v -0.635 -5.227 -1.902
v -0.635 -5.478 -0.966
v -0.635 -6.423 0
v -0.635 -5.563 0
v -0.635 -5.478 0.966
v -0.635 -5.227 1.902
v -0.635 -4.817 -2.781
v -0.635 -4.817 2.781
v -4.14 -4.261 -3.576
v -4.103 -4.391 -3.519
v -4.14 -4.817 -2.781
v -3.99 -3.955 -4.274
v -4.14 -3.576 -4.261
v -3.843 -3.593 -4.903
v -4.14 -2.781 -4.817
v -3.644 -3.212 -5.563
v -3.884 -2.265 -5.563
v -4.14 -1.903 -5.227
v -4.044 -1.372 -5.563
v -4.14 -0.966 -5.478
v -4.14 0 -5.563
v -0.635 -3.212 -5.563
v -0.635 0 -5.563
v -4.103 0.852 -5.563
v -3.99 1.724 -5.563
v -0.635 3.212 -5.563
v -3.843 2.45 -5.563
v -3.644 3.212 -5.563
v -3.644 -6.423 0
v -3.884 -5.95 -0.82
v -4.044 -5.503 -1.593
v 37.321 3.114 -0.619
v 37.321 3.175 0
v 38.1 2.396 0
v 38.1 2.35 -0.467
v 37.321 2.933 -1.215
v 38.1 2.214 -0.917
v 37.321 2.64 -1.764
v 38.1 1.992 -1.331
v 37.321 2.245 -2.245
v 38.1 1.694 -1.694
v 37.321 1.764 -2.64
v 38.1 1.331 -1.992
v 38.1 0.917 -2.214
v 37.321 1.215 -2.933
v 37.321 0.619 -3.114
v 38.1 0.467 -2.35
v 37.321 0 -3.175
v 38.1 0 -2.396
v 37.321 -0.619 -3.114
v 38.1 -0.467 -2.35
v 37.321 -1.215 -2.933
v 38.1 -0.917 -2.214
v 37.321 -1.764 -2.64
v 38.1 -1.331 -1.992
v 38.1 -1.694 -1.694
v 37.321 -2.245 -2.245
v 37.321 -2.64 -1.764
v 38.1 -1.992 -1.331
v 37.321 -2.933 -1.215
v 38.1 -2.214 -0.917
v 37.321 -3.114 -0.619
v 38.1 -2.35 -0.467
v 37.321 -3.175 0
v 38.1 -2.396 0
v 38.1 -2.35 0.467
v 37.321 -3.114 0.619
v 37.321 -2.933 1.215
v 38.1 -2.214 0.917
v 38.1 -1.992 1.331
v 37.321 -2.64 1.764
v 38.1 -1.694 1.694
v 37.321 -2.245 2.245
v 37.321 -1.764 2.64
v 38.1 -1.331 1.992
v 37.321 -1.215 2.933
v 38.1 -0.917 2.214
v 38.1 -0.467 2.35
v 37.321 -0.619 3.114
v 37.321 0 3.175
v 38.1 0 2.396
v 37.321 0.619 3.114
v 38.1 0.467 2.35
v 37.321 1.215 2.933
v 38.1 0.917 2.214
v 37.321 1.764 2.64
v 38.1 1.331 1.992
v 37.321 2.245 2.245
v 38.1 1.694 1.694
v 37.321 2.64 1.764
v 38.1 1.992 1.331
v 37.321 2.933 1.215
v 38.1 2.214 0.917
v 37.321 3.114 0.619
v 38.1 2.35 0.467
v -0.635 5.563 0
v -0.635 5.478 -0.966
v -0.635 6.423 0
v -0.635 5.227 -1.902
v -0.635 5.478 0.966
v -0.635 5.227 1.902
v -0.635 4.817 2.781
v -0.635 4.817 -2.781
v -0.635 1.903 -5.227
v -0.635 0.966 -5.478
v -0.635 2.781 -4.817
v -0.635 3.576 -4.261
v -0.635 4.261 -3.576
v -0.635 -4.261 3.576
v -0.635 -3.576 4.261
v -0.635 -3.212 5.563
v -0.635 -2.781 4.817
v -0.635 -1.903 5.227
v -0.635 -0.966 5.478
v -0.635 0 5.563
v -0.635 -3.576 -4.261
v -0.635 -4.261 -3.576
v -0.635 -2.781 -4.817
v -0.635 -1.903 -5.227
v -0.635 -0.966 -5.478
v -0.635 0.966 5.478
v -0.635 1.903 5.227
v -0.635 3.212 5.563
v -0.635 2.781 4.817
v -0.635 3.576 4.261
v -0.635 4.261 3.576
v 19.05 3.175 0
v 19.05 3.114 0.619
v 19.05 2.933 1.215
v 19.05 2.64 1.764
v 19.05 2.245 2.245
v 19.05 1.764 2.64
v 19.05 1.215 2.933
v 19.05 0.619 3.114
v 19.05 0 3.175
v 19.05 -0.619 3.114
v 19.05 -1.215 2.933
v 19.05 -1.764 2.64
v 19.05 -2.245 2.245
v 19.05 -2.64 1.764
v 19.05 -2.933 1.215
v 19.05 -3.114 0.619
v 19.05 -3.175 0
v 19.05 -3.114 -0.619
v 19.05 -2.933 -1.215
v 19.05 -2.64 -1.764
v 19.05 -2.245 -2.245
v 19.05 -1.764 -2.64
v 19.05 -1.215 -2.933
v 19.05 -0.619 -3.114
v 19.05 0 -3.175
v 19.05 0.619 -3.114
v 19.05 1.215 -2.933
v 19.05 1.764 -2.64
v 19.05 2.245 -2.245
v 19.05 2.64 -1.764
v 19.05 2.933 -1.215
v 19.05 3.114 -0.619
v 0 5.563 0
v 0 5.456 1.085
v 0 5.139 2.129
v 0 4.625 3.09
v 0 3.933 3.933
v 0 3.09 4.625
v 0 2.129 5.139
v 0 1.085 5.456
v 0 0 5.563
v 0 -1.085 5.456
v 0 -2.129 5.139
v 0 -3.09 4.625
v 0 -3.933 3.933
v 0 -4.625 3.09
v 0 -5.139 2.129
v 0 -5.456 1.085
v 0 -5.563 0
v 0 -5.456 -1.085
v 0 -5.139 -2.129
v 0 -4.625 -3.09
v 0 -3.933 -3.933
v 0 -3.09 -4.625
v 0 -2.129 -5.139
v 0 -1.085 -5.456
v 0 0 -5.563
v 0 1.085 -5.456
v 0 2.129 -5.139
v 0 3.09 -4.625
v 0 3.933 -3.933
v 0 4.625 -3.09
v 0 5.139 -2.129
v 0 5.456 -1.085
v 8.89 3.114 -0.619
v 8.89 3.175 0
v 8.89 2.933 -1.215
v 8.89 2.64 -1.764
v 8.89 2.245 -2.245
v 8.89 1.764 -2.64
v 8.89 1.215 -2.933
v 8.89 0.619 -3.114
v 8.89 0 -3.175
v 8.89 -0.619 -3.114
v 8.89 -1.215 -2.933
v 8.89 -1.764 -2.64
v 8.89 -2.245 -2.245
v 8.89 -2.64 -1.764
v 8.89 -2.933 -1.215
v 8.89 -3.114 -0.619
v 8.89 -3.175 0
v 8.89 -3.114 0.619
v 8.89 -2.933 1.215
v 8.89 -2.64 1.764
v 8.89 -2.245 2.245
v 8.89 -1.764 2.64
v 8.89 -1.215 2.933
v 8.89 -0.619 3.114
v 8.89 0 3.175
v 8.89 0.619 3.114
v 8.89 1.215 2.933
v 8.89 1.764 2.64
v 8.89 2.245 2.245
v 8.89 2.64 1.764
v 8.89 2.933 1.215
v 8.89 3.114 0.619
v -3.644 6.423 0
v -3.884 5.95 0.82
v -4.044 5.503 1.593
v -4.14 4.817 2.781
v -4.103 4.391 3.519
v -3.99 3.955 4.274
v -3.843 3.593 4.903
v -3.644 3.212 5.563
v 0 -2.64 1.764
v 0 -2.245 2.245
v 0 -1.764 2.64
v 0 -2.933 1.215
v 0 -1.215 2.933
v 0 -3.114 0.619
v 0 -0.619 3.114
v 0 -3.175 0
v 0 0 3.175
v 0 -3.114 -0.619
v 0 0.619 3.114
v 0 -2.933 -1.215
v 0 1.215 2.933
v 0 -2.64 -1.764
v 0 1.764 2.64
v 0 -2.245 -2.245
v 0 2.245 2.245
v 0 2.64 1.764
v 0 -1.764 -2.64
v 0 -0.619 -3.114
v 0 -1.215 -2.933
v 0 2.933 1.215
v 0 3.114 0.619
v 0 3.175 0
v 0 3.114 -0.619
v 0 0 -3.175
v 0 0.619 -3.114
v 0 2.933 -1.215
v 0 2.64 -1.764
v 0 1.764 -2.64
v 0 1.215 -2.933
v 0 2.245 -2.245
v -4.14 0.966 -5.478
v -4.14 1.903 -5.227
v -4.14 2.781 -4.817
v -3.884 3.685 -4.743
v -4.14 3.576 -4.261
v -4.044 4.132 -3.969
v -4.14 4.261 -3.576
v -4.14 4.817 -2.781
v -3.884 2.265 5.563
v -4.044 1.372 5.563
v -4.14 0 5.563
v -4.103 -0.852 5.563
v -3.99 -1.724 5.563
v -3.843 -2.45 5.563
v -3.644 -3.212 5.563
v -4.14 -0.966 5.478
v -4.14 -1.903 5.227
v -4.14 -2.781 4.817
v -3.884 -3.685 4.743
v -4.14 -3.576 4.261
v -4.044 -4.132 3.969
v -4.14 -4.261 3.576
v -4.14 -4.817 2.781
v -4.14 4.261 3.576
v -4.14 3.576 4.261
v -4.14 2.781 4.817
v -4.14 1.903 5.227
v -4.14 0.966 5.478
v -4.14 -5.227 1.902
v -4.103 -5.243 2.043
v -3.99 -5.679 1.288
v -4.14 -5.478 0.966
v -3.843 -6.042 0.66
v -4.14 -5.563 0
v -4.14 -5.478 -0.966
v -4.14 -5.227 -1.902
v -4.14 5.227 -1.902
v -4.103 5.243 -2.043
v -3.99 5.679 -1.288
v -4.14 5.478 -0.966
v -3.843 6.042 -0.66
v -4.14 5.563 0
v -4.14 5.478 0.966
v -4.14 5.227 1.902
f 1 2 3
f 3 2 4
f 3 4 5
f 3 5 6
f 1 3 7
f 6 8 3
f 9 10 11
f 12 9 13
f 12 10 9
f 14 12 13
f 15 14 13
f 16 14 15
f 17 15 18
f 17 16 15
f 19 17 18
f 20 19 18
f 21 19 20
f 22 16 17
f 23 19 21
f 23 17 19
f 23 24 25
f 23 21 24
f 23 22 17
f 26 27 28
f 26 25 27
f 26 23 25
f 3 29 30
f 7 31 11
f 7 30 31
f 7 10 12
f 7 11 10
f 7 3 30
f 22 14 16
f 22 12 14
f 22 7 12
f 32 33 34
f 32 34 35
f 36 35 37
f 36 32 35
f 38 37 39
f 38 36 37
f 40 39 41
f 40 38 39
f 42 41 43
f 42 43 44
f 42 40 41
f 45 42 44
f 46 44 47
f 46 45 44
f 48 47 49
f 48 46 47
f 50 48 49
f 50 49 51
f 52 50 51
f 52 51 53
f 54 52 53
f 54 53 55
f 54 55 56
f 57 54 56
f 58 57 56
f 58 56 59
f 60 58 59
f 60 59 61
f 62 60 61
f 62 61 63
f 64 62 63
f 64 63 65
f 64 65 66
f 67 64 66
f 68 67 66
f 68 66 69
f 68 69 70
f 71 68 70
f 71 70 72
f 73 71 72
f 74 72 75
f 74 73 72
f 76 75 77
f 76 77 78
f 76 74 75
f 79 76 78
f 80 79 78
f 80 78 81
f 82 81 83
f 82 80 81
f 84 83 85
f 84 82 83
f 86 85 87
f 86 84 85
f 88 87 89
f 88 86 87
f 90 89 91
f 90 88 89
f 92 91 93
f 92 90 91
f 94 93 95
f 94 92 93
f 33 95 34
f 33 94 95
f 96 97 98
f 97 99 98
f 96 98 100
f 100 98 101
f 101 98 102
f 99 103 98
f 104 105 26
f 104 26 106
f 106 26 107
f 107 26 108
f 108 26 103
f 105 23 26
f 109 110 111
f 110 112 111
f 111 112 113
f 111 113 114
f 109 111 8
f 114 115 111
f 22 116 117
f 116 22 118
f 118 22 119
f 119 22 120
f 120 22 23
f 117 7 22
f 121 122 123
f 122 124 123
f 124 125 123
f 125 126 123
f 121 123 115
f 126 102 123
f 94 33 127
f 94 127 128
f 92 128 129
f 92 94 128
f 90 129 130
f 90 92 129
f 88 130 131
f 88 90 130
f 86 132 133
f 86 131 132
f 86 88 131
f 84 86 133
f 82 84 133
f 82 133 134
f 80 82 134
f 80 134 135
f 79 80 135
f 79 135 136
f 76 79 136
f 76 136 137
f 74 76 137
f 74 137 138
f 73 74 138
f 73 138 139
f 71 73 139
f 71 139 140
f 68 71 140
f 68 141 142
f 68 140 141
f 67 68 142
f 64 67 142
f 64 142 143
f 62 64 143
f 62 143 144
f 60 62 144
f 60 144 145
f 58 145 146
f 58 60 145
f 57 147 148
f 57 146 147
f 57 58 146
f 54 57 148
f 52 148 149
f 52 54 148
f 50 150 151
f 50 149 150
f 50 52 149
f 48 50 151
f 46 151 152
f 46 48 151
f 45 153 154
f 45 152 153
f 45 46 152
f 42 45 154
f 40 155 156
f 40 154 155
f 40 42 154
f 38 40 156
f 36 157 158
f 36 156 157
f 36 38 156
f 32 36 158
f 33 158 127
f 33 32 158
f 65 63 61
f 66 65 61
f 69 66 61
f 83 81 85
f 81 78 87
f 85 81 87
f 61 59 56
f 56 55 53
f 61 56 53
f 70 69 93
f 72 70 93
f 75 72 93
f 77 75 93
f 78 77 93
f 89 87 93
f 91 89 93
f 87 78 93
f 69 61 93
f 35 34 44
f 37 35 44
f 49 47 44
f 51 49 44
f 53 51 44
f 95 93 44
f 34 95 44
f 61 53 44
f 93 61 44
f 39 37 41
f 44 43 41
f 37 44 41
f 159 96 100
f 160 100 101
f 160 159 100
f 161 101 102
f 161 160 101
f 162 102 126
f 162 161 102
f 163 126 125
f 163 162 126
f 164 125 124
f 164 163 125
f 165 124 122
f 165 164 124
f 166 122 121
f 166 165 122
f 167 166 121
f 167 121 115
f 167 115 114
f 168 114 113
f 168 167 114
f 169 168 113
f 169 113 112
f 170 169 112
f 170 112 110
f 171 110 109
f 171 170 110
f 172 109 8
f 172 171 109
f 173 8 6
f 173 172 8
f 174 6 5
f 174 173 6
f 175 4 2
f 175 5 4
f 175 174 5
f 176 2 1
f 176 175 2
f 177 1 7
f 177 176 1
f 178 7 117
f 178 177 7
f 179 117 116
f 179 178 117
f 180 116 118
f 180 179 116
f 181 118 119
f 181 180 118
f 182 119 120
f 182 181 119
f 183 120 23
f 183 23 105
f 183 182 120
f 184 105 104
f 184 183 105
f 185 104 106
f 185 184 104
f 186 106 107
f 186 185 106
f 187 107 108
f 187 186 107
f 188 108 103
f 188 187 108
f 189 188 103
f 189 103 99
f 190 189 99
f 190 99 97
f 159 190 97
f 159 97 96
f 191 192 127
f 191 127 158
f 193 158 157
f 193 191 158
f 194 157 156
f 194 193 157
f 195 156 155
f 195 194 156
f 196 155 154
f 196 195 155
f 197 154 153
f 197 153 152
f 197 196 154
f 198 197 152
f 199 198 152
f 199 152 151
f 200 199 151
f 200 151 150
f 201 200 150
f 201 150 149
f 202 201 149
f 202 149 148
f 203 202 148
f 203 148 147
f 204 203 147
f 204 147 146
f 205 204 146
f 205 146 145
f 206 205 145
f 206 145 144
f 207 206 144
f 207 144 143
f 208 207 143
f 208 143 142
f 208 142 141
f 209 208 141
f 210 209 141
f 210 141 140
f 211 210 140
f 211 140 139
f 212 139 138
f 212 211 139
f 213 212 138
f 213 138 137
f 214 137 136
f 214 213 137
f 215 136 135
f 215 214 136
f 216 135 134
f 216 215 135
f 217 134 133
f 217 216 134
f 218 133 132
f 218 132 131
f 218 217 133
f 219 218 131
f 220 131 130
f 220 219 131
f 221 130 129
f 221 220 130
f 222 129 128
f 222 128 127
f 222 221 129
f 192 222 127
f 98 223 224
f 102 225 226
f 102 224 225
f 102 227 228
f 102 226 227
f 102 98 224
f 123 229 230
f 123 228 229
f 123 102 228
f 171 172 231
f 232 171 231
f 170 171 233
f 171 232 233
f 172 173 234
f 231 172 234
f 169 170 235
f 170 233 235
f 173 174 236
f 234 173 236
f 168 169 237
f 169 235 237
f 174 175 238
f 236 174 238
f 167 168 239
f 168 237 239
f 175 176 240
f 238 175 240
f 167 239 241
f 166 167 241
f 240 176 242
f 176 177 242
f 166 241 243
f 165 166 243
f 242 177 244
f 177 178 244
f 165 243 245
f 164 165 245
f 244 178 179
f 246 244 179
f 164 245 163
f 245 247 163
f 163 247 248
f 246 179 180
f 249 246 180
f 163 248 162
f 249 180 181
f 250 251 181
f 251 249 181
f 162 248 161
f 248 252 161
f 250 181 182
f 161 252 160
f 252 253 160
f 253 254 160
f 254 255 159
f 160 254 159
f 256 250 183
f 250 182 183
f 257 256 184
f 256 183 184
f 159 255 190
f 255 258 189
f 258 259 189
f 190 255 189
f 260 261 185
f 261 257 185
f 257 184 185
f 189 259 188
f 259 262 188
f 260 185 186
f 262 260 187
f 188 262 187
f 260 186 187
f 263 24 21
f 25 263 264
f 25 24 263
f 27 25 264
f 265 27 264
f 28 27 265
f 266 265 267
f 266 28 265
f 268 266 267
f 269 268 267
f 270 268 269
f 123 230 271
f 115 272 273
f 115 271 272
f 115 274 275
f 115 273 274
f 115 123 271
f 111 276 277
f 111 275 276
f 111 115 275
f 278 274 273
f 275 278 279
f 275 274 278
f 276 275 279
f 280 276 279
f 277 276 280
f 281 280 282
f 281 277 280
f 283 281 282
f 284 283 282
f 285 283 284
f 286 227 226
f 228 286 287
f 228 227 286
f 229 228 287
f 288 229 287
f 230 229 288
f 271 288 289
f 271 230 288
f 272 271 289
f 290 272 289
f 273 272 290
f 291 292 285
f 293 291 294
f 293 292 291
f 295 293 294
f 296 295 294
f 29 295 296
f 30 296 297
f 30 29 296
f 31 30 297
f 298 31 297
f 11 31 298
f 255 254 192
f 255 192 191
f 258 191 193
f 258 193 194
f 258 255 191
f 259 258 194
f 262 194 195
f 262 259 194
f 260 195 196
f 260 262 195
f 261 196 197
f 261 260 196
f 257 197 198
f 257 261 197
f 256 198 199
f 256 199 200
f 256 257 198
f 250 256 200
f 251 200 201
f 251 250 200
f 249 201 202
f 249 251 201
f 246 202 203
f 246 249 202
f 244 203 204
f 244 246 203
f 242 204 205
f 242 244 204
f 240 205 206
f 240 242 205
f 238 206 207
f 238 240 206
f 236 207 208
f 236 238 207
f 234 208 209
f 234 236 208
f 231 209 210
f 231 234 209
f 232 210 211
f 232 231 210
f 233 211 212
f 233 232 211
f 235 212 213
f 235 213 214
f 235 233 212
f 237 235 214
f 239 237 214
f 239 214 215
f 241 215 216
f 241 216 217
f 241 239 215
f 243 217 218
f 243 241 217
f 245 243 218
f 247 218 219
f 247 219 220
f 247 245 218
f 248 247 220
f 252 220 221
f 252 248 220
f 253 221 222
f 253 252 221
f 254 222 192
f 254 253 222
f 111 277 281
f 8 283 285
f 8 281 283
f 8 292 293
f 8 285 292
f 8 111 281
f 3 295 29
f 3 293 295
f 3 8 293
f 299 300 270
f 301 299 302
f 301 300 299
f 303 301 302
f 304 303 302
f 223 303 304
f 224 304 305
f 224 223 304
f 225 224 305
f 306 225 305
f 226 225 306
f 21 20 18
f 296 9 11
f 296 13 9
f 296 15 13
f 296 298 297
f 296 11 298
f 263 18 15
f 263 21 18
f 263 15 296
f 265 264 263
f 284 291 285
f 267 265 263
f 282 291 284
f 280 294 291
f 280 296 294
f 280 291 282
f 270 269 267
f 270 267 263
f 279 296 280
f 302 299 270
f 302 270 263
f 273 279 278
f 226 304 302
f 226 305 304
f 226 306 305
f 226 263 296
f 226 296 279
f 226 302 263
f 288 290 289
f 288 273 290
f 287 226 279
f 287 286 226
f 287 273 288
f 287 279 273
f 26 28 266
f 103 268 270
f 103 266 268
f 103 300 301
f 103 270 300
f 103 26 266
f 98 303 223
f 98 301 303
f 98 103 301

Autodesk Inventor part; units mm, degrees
ref_plane "YZ Plane" through (0, 0, 0) normal (1, 0, 0) x (0, 1, 0)
ref_plane "XZ Plane" through (0, 0, 0) normal (0, 1, 0) x (-1, 0, 0)
sketch "Sketch1" plane through (0, 0, 0) normal (0, 0, 1) x (1, 0, 0)
  line L0 (0, 5.5626) -> (0, 3.175)
  line L1 (19.05, 3.175) -> (38.1, 3.175)
  line L2 (38.1, 3.175) -> (38.1, 0)
  line L3 (38.1, 0) -> (-0.6351, 0)
  line L4 (-8.3821, 0) -> (45.847, 0) projected
  line L5 (-0.6351, 0) -> (-0.6351, 5.5626)
  line L6 (-0.6351, 5.5626) -> (0, 5.5626)
  line L7 (19.05, 3.175) -> (8.8899, 3.175)
  line L8 (8.8899, 3.175) -> (0, 3.175)
  line L9 (0, -1.1125) -> (0, 6.6751) projected
  dimension "d0" = 38.1
  dimension "d1" = 19.05
  dimension "d2" = 6.35
  dimension "d9" = 0.6351
  dimension "d10" = 11.1252
  dimension "d13" = 10.1601
  dimension "d14" = 6.35
revolve "Body" add sketch "Sketch1" angle 360 about axis through (38.1, 0, 0) along (-1, 0, 0)
sketch "Sketch2" plane through (-0.6351, 0, 0) normal (-1, 0, 0) x (0, 0, 1)
  line L0 (0, 6.4231) -> (5.5626, 3.2116)
  line L1 (5.5626, 3.2116) -> (5.5626, -3.2116)
  line L2 (5.5626, -3.2116) -> (0, -6.4231)
  line L3 (0, -6.4231) -> (-5.5626, -3.2116)
  line L4 (-5.5626, -3.2116) -> (-5.5626, 3.2116)
  line L5 (-5.5626, 3.2116) -> (0, 6.4231)
  point P0 (0, 0)
  point P1 (0, 0)
  dimension "d11" = 11.1252
extrude "Head" add sketch "Sketch2" along normal blind 3.5052
sketch "Sketch4" plane through (0, 0, 0) normal (0, 0, 1) x (1, 0, 0)
  line L0 (-4.1403, 5.5626) -> (-4.1403, 6.4231)
  line L1 (-4.1403, 6.4231) -> (-3.6435, 6.4231)
  line L2 (-3.6435, 6.4231) -> (-4.1403, 5.5626)
  line L3 (-4.8413, 0) -> (0.0659, 0) projected
  line L4 (-0.6351, 6.4231) -> (-4.1403, 6.4231) projected
  line L5 (-4.1403, 3.2116) -> (-4.1403, 6.4231) projected
  dimension "d5" = 30
  dimension "d19" = 11.1252
revolve "Chamfer1" cut sketch "Sketch4" angle 360 about axis through (-10, 0, 0) along (1, 0, 0)
thread "Thread" size "1/4-20 UNC" class "2A" standard "ANSI Unified Screw Threads" length 19.05
chamfer "Chamfer2" distance 0.779 distance2 0.7791 1 edges at (38.1, -3.175, 0) measured on face at (38.1, -0.7017, 0.0433)
ref_plane "Work Plane1" through (1.525, 0, 0) normal (0, 0, 1) x (1, 0, 0)
equation "\"d0\" = NLG"
equation "\"d1\" = GEL"
equation "\"d2\" = GD"
equation "\"d10\" = SD2"
equation "\"d14\" = BDM"
equation "\"d11\" = SW"
equation "\"d3\" = KOH - SD"
equation "\"d5\" = ANG1"
equation "\"d19\" = SW0"
equation "\"d15\" = GEL"
equation "\"d6\" = -0.5 * SPD + 0.5 * GD"
equation "\"NLG\" = 38.1"
equation "\"GD\" = 6.35"
equation "\"BDM\" = 6.35"
equation "\"KOH\" = 4.1402"
equation "\"GEL\" = 19.05"
equation "\"SW\" = 11.1252"
equation "\"SW0\" = SW"
equation "\"SPD\" = GD1"
equation "\"SD2\" = SW"
equation "\"SD\" = 0.635"
equation "\"ANG1\" = 30deg"
equation "\"GAL\" = 10.16"
equation "\"GUL\" = 0.77902"
equation "\"RR\" = 0.381"
equation "\"WFT\" = SD"
equation "\"GD1\" = 4.79196"
equation "\"THREADDIA\" = 6.35"
equation "\"SDH\" = SW"
equation "\"SDHG\" = 8.89"
equation "\"TOA\" = 30deg"
equation "\"FAWI\" = 45deg"
equation "\"NND\" = 6.35"
equation "\"E0\" = 12.84961"
properties part number "AS 2465 - 1/4 x 1 1/2  UNC" material "Steel, Mild"
